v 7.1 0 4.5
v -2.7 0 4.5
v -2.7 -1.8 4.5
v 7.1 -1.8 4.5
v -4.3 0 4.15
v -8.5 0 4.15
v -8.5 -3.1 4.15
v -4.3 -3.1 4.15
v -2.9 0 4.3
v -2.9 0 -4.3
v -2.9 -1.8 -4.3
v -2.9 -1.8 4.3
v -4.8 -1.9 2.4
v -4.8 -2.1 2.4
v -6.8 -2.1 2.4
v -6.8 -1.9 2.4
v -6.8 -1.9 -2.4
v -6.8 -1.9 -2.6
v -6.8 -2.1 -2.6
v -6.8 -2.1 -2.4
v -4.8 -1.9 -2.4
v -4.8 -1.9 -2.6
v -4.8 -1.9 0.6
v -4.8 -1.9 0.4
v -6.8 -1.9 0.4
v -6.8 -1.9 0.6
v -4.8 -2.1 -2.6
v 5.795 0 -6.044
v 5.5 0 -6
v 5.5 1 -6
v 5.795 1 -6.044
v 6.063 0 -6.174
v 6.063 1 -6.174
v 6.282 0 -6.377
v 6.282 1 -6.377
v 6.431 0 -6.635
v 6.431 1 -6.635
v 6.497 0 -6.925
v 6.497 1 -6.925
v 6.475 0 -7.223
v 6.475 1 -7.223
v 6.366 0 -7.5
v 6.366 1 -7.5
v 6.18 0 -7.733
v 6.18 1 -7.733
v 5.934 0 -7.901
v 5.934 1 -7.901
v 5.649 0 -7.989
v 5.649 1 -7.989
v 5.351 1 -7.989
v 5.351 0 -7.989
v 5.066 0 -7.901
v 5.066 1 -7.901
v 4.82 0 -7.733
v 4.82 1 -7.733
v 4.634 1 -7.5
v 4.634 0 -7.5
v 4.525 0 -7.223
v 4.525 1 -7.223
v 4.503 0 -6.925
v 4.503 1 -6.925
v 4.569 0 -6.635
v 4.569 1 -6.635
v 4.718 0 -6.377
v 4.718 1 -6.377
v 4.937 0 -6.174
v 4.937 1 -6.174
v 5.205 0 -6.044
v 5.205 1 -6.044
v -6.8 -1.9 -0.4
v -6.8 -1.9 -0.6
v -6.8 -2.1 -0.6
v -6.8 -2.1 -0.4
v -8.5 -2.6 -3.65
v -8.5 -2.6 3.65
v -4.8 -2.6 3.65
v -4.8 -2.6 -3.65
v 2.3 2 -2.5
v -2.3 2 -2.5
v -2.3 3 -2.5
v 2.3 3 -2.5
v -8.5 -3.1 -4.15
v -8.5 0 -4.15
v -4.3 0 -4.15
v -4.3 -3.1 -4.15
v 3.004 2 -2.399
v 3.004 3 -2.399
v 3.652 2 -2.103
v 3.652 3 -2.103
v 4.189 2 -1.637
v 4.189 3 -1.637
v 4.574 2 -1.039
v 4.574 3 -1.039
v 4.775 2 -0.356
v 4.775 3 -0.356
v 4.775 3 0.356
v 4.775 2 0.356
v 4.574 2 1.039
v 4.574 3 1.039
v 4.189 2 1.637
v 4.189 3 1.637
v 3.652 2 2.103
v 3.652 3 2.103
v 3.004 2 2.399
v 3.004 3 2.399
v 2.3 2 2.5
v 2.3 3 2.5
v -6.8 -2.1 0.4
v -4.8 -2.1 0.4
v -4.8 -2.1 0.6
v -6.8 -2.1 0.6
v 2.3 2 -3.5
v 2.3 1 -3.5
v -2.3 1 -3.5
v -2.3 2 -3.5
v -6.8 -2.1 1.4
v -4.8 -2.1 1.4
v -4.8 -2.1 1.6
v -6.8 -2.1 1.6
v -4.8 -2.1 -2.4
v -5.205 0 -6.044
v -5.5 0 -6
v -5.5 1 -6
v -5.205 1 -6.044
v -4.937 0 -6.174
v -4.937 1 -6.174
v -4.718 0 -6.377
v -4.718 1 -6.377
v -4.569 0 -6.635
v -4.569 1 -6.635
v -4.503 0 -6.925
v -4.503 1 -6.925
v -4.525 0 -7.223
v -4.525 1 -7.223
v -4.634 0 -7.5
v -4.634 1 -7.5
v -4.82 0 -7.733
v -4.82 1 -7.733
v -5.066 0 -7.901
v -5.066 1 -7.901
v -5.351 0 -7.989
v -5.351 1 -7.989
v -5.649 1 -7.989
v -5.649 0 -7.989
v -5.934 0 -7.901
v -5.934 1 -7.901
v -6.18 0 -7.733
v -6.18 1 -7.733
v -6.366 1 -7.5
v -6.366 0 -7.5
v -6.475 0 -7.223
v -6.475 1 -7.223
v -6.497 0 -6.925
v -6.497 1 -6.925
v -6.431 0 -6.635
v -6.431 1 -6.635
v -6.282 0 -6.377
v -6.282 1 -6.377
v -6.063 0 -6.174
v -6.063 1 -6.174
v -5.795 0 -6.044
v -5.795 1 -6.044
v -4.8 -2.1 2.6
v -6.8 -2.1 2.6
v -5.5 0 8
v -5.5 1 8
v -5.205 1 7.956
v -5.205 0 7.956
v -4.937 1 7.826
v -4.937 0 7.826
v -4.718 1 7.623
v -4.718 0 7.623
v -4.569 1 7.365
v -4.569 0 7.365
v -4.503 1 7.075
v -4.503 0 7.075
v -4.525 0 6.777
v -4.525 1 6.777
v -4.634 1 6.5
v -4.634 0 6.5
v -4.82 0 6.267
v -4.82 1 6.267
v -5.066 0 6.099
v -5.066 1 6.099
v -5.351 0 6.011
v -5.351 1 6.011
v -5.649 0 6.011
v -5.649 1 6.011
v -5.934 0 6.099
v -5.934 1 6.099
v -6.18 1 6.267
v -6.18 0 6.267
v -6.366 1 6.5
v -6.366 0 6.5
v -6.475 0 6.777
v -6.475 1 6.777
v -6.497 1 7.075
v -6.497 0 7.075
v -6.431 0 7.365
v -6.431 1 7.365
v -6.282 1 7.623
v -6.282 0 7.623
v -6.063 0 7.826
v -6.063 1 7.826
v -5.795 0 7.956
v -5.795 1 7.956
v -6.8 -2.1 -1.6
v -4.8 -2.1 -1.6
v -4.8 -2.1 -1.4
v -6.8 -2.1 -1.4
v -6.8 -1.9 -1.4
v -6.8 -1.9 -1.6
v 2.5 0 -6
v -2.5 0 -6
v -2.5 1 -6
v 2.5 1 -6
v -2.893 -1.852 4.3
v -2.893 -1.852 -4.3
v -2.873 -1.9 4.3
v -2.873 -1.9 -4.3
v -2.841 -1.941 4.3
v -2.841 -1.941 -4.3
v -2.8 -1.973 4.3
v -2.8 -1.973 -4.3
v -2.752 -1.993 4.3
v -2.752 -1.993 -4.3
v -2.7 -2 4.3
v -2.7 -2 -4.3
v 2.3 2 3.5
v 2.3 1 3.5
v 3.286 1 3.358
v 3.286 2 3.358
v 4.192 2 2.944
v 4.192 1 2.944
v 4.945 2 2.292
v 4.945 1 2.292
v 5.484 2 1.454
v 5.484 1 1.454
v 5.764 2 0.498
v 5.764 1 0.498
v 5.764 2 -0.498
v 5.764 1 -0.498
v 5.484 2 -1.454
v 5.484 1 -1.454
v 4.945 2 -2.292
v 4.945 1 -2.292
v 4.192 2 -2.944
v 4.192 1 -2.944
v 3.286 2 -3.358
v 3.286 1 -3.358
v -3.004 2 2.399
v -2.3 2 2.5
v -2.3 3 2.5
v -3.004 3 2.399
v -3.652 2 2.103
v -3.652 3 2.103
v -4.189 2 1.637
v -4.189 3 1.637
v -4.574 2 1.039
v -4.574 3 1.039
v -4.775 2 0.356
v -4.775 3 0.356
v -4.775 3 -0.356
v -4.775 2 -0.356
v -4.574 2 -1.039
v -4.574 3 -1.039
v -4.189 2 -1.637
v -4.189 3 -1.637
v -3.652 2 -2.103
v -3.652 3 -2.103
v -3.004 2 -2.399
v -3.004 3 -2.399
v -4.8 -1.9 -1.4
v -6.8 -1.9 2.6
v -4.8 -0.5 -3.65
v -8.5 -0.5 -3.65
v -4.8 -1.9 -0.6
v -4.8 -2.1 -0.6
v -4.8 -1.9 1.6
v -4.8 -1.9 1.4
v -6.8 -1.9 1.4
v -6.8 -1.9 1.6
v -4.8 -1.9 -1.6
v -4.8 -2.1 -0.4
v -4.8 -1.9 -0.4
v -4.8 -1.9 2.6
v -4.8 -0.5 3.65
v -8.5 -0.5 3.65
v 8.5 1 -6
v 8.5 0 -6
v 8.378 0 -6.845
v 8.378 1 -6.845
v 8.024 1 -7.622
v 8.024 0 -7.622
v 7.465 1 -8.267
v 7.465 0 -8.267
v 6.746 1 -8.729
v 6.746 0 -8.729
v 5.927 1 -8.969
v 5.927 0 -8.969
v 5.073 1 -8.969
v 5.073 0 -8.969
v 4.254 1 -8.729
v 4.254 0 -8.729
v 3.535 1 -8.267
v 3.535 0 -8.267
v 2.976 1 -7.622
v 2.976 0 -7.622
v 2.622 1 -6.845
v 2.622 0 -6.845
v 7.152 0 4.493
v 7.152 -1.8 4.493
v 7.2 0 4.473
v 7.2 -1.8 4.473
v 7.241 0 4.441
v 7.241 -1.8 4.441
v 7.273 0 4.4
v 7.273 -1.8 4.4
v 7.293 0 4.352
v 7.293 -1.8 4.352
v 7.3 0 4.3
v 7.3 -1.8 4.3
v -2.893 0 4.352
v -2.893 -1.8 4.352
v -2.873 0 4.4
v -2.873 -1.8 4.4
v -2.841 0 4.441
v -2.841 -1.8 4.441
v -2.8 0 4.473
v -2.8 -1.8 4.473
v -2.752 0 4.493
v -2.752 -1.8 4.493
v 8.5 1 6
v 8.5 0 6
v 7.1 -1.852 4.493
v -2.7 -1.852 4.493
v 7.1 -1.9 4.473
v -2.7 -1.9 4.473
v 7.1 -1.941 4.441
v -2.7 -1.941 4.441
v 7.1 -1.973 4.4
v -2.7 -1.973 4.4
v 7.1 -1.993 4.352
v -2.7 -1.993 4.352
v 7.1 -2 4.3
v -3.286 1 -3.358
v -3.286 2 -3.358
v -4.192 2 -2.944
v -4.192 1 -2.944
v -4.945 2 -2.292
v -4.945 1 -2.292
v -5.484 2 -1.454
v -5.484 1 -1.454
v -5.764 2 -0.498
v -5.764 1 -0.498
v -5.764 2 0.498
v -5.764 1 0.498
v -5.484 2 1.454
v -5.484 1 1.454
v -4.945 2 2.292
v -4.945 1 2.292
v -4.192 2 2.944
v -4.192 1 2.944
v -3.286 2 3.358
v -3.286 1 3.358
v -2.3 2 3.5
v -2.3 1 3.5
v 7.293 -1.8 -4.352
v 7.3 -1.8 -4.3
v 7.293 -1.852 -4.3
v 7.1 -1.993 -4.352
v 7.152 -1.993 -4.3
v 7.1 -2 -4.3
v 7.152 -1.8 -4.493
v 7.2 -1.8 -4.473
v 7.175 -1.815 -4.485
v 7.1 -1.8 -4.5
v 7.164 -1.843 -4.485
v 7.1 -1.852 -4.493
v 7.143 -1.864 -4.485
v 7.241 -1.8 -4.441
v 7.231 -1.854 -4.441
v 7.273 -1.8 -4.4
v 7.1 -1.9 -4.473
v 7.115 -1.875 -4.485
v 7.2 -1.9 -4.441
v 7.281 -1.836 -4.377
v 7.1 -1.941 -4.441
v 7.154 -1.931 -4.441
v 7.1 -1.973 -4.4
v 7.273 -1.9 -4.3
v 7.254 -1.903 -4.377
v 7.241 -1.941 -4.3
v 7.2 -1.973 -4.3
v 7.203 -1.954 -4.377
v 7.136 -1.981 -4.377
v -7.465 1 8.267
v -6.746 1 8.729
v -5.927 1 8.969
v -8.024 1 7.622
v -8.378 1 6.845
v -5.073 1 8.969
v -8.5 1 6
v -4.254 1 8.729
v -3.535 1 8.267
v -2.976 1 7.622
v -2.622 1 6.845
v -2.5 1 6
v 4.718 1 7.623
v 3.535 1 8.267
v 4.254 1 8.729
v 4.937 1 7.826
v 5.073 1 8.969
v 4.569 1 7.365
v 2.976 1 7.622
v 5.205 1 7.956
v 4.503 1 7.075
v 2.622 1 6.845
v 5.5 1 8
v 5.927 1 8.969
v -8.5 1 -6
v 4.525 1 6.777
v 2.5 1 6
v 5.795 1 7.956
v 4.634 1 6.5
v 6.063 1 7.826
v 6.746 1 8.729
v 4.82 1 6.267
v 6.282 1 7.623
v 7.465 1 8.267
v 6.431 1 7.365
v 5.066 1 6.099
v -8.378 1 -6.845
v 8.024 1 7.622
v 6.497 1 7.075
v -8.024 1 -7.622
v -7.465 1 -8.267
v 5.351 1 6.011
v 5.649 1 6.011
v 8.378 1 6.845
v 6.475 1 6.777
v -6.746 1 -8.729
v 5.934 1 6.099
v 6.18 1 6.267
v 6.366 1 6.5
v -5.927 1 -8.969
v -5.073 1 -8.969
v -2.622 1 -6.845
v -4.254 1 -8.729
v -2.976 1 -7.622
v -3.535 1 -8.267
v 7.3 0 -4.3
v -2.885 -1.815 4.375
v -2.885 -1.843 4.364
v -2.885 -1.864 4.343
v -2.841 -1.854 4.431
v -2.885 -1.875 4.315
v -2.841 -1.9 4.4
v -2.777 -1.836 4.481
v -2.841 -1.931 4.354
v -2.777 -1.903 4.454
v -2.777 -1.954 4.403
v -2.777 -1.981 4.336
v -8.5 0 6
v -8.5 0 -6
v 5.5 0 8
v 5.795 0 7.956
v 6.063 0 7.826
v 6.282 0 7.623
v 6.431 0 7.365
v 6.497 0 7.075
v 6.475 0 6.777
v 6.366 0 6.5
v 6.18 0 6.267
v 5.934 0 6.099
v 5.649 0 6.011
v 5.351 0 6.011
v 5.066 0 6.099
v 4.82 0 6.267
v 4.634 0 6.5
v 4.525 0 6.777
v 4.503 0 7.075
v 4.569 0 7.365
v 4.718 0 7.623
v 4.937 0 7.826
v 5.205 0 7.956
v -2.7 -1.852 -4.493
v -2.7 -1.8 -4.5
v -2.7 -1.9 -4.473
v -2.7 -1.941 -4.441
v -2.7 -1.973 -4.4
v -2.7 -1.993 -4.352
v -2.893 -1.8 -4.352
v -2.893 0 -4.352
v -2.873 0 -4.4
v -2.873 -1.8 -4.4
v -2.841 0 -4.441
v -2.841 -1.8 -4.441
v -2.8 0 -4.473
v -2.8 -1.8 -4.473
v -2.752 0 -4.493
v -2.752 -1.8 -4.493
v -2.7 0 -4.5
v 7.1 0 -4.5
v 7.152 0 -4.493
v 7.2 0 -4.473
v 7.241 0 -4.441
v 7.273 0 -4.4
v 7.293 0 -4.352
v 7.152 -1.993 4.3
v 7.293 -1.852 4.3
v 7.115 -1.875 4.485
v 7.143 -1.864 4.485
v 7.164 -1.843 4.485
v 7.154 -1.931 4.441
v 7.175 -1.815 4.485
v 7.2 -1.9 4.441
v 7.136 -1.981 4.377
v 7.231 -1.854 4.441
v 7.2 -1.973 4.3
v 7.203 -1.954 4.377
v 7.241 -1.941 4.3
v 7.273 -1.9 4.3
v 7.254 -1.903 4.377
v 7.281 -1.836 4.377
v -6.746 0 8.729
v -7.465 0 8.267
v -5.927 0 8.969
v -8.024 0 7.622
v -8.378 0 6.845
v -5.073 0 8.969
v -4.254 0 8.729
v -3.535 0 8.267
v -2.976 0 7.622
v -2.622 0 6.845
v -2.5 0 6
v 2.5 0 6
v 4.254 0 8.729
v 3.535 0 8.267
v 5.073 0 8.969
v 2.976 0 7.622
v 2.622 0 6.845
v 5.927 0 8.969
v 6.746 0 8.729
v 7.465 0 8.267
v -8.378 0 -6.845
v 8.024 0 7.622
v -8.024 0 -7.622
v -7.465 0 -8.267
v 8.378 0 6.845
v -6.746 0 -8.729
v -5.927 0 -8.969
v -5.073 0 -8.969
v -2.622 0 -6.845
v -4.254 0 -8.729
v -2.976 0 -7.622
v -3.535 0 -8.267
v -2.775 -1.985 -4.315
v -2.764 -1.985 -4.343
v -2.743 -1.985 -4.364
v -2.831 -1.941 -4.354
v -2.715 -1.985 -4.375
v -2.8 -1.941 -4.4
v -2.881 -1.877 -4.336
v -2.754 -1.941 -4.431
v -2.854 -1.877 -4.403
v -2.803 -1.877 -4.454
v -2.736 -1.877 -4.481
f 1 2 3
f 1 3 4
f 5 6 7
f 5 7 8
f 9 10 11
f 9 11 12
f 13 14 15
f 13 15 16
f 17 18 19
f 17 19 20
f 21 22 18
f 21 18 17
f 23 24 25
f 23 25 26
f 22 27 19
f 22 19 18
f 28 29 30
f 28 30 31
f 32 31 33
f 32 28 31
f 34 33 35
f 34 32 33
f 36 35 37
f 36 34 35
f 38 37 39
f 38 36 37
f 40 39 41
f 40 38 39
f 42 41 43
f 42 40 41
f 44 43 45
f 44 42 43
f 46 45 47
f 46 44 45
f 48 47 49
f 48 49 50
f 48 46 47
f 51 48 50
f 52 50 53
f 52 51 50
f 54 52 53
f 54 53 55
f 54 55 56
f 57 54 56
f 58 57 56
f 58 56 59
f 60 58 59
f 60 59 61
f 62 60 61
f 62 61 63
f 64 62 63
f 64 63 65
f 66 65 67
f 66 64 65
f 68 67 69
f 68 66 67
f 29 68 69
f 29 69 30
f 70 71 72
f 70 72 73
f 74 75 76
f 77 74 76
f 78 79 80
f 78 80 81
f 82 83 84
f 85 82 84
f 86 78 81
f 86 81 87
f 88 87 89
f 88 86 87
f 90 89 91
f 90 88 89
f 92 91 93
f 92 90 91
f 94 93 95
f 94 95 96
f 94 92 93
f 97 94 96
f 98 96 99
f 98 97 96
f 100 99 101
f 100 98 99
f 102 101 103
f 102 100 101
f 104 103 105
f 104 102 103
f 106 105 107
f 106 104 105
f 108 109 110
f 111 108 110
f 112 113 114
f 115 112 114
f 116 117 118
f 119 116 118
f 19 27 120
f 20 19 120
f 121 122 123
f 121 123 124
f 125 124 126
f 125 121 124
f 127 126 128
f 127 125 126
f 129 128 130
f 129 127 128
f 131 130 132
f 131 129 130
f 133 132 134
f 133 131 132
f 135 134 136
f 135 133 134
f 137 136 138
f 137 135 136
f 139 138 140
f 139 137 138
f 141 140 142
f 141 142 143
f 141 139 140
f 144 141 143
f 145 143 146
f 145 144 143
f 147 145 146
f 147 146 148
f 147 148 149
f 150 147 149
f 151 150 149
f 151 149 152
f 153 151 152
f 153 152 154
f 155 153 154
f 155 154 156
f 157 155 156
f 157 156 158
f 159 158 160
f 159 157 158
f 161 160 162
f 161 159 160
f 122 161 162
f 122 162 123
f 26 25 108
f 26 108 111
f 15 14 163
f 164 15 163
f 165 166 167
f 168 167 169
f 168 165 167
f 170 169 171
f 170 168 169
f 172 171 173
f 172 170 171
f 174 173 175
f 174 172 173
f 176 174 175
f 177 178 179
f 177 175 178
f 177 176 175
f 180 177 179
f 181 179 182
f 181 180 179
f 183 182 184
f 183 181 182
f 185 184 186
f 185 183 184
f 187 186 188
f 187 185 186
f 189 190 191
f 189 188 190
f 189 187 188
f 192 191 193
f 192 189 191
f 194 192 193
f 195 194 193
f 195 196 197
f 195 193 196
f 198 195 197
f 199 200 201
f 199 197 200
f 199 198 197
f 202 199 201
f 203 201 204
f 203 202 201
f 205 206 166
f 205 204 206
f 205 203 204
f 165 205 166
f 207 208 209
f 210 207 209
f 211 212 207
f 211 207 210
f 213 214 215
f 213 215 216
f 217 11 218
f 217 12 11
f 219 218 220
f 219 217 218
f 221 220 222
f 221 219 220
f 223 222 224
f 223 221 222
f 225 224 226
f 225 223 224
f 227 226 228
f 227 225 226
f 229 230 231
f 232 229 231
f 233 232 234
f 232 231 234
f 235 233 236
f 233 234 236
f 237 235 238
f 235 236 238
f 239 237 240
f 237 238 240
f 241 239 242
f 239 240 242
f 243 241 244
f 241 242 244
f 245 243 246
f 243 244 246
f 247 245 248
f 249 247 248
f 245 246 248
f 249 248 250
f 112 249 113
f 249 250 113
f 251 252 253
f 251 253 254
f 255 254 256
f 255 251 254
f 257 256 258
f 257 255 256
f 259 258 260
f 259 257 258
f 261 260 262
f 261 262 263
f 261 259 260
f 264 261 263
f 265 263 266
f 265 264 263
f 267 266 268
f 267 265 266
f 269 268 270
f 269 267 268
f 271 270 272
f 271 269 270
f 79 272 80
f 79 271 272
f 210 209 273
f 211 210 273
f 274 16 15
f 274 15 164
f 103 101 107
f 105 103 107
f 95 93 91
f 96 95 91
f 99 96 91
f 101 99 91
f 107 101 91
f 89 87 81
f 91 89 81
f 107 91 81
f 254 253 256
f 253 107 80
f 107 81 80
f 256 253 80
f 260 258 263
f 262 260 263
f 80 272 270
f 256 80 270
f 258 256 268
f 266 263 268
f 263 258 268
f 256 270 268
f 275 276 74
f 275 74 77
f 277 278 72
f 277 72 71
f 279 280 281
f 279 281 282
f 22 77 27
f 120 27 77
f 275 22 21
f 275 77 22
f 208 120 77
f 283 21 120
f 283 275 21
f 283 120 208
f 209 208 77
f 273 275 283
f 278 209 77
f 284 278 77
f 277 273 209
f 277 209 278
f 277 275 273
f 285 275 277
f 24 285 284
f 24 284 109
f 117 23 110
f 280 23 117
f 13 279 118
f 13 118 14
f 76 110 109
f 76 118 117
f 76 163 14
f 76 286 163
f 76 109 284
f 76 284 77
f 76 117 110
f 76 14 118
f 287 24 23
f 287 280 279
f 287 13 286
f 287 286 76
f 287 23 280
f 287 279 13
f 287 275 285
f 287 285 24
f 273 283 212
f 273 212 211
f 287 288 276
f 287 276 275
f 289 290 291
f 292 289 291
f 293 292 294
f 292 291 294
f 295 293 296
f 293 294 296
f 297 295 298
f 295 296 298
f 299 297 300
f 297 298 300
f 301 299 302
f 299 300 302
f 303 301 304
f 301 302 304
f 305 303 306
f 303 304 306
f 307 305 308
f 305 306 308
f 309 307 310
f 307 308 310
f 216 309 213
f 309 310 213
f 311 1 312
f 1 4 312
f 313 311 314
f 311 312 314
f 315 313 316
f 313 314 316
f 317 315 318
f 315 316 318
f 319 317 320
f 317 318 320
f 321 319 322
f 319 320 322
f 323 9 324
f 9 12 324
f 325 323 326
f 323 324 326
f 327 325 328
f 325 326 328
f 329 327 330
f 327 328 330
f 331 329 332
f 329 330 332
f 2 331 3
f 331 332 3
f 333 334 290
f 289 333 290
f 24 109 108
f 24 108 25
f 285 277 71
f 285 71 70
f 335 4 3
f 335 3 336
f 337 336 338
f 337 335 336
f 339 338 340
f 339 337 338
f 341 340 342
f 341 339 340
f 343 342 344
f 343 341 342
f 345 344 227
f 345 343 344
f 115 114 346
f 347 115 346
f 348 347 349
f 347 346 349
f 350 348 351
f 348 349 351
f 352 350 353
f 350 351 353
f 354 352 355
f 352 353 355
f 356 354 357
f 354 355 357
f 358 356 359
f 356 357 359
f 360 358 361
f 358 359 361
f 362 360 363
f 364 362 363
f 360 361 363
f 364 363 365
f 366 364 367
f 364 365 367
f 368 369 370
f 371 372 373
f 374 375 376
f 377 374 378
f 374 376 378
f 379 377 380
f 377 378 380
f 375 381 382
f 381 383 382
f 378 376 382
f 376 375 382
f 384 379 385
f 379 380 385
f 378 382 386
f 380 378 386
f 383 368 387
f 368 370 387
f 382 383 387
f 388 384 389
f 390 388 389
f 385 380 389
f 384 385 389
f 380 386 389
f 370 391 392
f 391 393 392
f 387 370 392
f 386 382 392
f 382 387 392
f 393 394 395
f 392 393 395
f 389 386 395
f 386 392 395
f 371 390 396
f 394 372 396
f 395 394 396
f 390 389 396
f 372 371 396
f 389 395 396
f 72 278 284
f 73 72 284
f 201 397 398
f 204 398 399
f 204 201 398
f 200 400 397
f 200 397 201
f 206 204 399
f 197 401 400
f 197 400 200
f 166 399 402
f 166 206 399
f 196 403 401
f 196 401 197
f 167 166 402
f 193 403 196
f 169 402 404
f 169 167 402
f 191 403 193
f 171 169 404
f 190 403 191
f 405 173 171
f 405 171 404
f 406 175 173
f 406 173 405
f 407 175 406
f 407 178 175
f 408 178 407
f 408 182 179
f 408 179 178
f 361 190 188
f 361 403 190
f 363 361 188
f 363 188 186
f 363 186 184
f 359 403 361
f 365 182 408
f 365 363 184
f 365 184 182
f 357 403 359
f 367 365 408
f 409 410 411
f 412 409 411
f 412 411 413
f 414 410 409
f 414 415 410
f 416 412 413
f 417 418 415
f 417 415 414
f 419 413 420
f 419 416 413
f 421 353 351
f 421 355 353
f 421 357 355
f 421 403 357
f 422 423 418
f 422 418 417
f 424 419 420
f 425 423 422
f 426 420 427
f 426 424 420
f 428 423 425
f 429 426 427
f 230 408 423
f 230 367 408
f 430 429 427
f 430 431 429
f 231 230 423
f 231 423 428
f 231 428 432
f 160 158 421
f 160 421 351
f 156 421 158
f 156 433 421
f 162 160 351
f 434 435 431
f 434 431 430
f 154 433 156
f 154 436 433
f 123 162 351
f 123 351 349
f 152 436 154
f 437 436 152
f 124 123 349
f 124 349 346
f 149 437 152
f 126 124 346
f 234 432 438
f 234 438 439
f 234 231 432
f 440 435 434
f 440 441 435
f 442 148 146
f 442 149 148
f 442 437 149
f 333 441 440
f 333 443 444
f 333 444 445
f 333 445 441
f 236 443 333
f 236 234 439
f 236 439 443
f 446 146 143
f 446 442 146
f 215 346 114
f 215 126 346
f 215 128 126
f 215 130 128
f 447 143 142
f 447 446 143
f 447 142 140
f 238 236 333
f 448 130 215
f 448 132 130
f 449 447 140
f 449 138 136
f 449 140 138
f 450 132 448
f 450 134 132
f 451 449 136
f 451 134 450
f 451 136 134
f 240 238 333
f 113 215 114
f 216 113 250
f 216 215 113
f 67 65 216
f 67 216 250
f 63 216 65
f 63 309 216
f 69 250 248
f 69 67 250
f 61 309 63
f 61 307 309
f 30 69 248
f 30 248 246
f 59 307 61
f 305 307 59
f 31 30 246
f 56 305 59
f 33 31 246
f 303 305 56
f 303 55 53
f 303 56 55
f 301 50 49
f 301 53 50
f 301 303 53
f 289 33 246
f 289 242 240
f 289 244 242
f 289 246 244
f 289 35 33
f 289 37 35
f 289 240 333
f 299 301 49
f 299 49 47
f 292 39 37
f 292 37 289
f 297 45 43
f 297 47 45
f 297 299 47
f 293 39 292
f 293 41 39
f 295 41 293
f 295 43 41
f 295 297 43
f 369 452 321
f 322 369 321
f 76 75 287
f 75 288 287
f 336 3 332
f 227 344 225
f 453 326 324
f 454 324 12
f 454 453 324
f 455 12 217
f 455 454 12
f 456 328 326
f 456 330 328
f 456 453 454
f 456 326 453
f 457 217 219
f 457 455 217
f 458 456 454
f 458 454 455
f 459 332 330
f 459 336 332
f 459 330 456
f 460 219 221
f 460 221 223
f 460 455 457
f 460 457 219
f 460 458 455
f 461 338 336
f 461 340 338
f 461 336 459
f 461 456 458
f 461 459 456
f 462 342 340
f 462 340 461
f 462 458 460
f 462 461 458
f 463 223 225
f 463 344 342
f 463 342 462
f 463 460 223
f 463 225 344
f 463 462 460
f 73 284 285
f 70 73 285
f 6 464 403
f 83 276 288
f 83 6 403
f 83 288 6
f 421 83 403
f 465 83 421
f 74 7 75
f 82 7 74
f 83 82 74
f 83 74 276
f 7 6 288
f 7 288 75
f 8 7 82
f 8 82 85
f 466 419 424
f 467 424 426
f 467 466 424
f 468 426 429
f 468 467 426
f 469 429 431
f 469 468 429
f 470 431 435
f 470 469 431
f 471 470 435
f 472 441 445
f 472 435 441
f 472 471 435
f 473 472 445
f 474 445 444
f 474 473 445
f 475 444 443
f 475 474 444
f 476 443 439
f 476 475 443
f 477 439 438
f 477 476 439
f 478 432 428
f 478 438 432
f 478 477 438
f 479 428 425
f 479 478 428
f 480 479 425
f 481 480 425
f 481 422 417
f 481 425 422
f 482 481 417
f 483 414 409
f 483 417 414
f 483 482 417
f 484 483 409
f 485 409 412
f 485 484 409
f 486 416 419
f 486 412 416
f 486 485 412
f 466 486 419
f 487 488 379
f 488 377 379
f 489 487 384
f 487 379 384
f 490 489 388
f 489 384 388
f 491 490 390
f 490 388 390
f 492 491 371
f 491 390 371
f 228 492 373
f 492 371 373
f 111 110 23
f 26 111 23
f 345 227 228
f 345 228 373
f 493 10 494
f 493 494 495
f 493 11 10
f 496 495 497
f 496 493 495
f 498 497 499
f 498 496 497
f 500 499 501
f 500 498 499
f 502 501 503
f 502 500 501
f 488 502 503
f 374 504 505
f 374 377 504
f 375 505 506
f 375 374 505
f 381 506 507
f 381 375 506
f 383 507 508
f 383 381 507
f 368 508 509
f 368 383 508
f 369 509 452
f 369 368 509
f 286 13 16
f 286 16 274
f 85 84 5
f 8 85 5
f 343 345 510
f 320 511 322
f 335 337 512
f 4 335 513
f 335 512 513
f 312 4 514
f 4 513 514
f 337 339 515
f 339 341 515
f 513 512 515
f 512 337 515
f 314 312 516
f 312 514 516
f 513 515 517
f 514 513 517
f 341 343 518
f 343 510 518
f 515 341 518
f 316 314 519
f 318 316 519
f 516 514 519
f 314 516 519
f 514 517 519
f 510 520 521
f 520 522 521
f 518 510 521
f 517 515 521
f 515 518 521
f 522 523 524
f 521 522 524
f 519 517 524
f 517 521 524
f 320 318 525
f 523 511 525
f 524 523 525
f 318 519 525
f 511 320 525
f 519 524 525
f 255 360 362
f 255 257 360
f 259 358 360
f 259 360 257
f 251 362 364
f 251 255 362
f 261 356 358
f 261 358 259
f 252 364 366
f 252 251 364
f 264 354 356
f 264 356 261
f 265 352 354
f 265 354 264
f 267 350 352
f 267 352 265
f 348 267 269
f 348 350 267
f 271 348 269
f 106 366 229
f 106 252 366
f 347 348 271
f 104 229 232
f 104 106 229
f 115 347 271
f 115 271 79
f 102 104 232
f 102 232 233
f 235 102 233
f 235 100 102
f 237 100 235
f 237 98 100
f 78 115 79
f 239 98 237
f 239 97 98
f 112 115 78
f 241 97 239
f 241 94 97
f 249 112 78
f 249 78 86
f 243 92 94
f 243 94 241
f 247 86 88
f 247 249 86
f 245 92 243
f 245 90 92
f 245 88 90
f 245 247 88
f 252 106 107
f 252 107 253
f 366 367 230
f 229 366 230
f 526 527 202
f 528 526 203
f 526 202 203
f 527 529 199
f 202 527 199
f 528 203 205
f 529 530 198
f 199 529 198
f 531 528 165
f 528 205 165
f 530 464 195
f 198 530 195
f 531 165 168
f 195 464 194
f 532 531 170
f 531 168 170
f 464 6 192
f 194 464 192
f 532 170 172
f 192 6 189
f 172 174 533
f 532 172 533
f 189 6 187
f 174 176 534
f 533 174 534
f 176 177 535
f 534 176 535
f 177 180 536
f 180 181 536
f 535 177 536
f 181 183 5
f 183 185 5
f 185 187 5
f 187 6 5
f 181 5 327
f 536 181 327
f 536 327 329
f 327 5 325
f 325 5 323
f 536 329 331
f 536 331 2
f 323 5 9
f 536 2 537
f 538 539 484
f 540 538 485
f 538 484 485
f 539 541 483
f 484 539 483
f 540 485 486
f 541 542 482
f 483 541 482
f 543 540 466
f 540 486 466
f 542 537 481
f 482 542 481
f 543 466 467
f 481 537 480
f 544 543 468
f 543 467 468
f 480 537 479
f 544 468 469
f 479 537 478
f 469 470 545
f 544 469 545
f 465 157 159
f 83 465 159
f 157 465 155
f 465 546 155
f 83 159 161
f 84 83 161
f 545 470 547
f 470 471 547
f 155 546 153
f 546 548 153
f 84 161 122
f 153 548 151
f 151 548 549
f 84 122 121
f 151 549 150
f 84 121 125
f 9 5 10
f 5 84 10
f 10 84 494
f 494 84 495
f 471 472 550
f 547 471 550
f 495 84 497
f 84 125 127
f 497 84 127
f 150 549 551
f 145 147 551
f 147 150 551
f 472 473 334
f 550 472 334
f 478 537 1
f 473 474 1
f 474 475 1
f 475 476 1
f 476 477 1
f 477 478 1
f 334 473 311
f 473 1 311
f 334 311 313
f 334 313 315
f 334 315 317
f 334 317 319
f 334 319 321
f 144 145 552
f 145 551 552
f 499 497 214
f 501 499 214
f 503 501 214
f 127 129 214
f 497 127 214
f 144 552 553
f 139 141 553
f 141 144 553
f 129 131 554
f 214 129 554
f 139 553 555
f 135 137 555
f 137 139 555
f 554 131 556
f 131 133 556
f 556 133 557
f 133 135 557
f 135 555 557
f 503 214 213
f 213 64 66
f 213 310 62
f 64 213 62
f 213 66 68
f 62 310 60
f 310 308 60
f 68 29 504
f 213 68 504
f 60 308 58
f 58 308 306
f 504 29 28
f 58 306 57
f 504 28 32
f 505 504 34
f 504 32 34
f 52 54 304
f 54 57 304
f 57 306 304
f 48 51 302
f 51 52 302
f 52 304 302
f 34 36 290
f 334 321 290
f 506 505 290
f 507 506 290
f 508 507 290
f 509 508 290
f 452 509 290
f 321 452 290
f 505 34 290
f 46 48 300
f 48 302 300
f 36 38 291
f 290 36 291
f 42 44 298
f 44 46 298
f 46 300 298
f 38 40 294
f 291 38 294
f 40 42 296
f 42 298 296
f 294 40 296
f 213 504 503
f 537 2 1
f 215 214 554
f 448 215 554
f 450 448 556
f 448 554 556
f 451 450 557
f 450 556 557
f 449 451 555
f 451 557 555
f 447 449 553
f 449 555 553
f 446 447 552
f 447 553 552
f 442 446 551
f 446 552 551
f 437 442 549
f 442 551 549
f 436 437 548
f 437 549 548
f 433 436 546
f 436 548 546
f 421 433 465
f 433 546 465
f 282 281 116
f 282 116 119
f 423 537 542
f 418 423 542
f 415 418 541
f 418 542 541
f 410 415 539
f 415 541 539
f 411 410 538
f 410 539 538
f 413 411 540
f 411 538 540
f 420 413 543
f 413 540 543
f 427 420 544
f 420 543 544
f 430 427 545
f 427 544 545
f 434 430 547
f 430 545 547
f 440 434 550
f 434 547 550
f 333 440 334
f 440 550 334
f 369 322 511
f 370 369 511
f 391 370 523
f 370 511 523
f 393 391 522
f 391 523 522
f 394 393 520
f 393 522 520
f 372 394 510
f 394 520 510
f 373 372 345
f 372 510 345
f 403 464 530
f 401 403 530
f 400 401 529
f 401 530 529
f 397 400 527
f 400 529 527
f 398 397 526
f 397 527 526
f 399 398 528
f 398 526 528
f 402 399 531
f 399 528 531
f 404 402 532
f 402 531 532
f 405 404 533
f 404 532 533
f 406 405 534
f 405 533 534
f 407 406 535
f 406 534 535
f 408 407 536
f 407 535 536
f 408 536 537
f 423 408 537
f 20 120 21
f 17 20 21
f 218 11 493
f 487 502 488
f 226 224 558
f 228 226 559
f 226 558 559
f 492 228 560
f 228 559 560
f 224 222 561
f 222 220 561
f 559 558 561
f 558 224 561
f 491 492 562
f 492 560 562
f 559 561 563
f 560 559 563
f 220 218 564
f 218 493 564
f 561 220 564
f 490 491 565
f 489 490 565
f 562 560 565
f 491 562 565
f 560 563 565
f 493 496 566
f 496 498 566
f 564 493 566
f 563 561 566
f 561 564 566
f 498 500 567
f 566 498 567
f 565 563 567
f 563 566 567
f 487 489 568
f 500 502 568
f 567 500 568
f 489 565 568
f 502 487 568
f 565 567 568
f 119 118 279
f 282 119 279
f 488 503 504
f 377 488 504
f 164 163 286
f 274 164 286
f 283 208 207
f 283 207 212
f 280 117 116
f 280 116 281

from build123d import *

# Parameters (mm, degrees)
SKETCH_1_R      = 1
EXTRUDE_1_DEPTH = 1
EXTRUDE_2_DEPTH = 1
EXTRUDE_3_DEPTH = 2
SKETCH_5_W      = 10.2
SKETCH_5_H      = 9
EXTRUDE_4_DEPTH = 2
SKETCH_5_3_W    = 4.2
SKETCH_5_3_H    = 8.3
EXTRUDE_5_DEPTH = 3.1
SHELL_1_T       = -0.5
SKETCH_6_W      = 0.2
SKETCH_6_H      = 0.2
EXTRUDE_6_DEPTH = 2
FILLET_1_R      = 0.2


with BuildPart() as part:
    # 草图1 → 凸台-拉伸1 (new body)
    with BuildSketch(Plane(origin=(0, 0, 0), x_dir=(1, 0, 0), z_dir=(0, 1, 0))):
        with BuildLine():
            ThreePointArc((2.5, -6), (5.5, -9), (8.5, -6))
            Line((8.5, -6), (8.5, 6))
            ThreePointArc((8.5, 6), (5.5, 9), (2.5, 6))
            Line((2.5, 6), (-2.5, 6))
            ThreePointArc((-2.5, 6), (-5.5, 9), (-8.5, 6))
            Line((-8.5, 6), (-8.5, -6))
            ThreePointArc((-8.5, -6), (-5.5, -9), (-2.5, -6))
            Line((-2.5, -6), (2.5, -6))
        make_face()
        with Locations((5.5, -7)):
            Circle(SKETCH_1_R, mode=Mode.SUBTRACT)
        with Locations((-5.5, -7)):
            Circle(SKETCH_1_R, mode=Mode.SUBTRACT)
        with Locations((-5.5, 7)):
            Circle(SKETCH_1_R, mode=Mode.SUBTRACT)
        with Locations((5.5, 7)):
            Circle(SKETCH_1_R, mode=Mode.SUBTRACT)
    extrude(amount=EXTRUDE_1_DEPTH)

    # 草图3 → 凸台-拉伸2 (add)
    with BuildSketch(Plane(origin=(0, 1, 0), x_dir=(1, 0, 0), z_dir=(0, 1, 0))):
        with BuildLine():
            Line((2.3, 3.5), (-2.3, 3.5))
            ThreePointArc((-2.3, 3.5), (-5.8, 0), (-2.3, -3.5))
            Line((-2.3, -3.5), (2.3, -3.5))
            ThreePointArc((2.3, -3.5), (5.8, 0), (2.3, 3.5))
        make_face()
        with BuildLine():
            ThreePointArc((-2.3, -2.5), (-4.8, 0), (-2.3, 2.5))
            Line((-2.3, 2.5), (2.3, 2.5))
            ThreePointArc((2.3, 2.5), (4.8, 0), (2.3, -2.5))
            Line((2.3, -2.5), (-2.3, -2.5))
        make_face(mode=Mode.SUBTRACT)
    extrude(amount=EXTRUDE_2_DEPTH)

    # 草图3<3> → 凸台-拉伸3 (add)
    with BuildSketch(Plane(origin=(0, 1, 0), x_dir=(1, 0, 0), z_dir=(0, 1, 0))):
        with BuildLine():
            Line((-2.3, 2.5), (2.3, 2.5))
            ThreePointArc((2.3, 2.5), (4.8, 0), (2.3, -2.5))
            Line((2.3, -2.5), (-2.3, -2.5))
            ThreePointArc((-2.3, -2.5), (-4.8, 0), (-2.3, 2.5))
        make_face()
    extrude(amount=EXTRUDE_3_DEPTH)

    # 草图5 → 凸台-拉伸4 (add)
    with BuildSketch(Plane.XZ):
        with Locations((2.2, 0)):
            Rectangle(SKETCH_5_W, SKETCH_5_H)
    extrude(amount=EXTRUDE_4_DEPTH)



with BuildPart() as body_2:
    # 草图5<3> → 凸台-拉伸5 (new body)
    with BuildSketch(Plane.XZ):
        with Locations((-6.4, 0)):
            Rectangle(SKETCH_5_3_W, SKETCH_5_3_H)
    extrude(amount=EXTRUDE_5_DEPTH)

    # 抽壳1
    shell_1_openings = [body_2.faces().sort_by_distance(p)[0] for p in [
        (-8.5, -1.55, 0),
    ]]
    offset(amount=SHELL_1_T, openings=shell_1_openings, kind=Kind.INTERSECTION)


with BuildPart() as part_1:
    add(part.part)

    add(body_2.part)  # 凸台-拉伸6 merges body 2
    # 草图6 → 凸台-拉伸6 (add)
    with BuildSketch(Plane.ZY.offset(4.8)):
        with Locations((1.5, -2)):
            Rectangle(SKETCH_6_W, SKETCH_6_H)
        with Locations((2.5, -2)):
            Rectangle(SKETCH_6_W, SKETCH_6_H)
        with Locations((0.5, -2)):
            Rectangle(SKETCH_6_W, SKETCH_6_H)
        with Locations((-0.5, -2)):
            Rectangle(SKETCH_6_W, SKETCH_6_H)
        with Locations((-1.5, -2)):
            Rectangle(SKETCH_6_W, SKETCH_6_H)
        with Locations((-2.5, -2)):
            Rectangle(SKETCH_6_W, SKETCH_6_H)
    extrude(amount=EXTRUDE_6_DEPTH)

    # 圆角1
    fillet_1_edges = [part_1.edges().sort_by_distance(p)[0] for p in [
        (-2.9, -2, 0),
        (2.2, -2, -4.5),
        (7.3, -2, 0),
        (2.2, -2, 4.5),
        (-2.9, -1, -4.5),
        (-2.9, -1, 4.5),
        (7.3, -1, -4.5),
        (7.3, -1, 4.5),
    ]]
    fillet(fillet_1_edges, radius=FILLET_1_R)


solid = part_1.part
